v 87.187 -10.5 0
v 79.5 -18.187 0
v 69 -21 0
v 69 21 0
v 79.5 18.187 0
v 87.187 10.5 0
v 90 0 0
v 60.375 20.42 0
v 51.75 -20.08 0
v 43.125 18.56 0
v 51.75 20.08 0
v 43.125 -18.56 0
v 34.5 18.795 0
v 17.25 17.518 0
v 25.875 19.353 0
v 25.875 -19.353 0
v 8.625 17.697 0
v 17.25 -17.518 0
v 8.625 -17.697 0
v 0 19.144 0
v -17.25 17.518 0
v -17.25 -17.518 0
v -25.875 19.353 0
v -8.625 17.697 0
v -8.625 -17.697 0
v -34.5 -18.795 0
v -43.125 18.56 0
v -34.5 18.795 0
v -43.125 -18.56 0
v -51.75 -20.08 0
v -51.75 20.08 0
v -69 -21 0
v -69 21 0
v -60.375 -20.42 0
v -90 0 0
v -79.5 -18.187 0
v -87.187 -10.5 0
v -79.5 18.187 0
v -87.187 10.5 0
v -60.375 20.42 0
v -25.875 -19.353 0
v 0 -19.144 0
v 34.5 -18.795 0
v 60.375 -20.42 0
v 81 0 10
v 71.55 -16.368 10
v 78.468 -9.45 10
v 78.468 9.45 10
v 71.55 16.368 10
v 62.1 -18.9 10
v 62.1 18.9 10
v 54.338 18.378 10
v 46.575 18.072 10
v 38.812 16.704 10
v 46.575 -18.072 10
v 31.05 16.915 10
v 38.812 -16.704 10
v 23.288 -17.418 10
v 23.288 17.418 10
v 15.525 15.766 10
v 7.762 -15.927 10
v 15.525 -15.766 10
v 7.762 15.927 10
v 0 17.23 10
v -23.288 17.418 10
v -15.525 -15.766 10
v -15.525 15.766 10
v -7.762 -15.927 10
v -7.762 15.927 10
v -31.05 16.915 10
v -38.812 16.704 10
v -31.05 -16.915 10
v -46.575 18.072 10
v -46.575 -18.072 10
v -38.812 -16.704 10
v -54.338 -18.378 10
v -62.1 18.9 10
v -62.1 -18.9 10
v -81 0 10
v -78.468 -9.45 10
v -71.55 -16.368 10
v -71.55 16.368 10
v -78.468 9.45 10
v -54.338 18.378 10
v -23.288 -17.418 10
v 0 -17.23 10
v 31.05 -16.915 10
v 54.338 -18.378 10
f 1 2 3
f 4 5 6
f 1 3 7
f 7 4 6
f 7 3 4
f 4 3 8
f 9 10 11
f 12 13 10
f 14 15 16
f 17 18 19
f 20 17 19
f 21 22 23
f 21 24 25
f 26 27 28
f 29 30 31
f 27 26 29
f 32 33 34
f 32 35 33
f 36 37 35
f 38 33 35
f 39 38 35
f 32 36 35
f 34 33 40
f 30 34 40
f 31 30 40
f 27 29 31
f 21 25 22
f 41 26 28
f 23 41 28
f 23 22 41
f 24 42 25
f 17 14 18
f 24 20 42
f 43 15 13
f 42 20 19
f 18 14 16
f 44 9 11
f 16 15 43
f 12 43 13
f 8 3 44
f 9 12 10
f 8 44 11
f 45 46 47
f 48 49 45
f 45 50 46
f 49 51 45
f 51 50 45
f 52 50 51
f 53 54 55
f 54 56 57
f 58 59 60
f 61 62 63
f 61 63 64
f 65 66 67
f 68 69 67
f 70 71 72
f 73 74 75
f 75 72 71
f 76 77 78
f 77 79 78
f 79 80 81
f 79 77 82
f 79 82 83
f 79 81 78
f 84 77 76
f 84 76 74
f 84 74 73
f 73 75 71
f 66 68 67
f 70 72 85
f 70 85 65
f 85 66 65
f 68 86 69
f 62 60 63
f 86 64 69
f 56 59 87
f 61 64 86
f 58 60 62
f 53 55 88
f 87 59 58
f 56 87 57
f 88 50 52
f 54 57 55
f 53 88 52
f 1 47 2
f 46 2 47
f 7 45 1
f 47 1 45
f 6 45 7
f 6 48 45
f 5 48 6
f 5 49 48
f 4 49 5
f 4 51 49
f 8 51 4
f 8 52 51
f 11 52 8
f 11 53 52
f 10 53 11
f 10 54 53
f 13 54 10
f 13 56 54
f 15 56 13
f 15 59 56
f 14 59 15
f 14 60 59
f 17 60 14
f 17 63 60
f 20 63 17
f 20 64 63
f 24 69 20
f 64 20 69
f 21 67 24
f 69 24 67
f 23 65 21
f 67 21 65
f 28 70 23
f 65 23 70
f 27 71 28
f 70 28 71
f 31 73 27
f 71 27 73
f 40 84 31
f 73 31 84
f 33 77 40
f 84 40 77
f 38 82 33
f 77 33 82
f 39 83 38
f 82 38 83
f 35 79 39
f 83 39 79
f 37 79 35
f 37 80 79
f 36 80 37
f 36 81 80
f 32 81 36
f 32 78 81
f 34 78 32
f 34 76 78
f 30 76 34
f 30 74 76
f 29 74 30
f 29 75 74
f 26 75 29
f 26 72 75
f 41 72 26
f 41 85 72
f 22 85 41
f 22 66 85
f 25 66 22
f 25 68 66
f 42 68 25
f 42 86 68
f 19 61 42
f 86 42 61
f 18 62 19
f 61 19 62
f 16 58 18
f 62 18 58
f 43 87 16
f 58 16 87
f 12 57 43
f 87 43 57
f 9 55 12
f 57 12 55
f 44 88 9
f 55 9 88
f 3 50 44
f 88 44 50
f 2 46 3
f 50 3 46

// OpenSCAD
$fn = 32;

// ----------------------------------------------------------------------
// Handle: 180 x 42 mm grip, 10 mm thick
// ----------------------------------------------------------------------

// --- parameters (mm) ---
length = 180;             // grip length
width = 42;               // grip width
thickness = 10;           // grip thickness
waist = 0.86;             // width factor at the middle
draft = 0.9;              // top face scale of the extrusion
scallops = 5;             // finger rests per side
ripple = 0.06;            // depth factor of the finger rests

/* ergonomic grip outline, closed spline-like polygon in the XY plane */
grip = [[-69, 21], [-60.375, 20.42], [-51.75, 20.08], [-43.125, 18.56], [-34.5, 18.795], [-25.875, 19.353], [-17.25, 17.518], [-8.625, 17.697], [0, 19.144], [8.625, 17.697], [17.25, 17.518], [25.875, 19.353], [34.5, 18.795], [43.125, 18.56], [51.75, 20.08], [60.375, 20.42], [69, 21], [79.5, 18.187], [87.187, 10.5], [90, 0], [87.187, -10.5], [79.5, -18.187], [69, -21], [69, -21], [60.375, -20.42], [51.75, -20.08], [43.125, -18.56], [34.5, -18.795], [25.875, -19.353], [17.25, -17.518], [8.625, -17.697], [0, -19.144], [-8.625, -17.697], [-17.25, -17.518], [-25.875, -19.353], [-34.5, -18.795], [-43.125, -18.56], [-51.75, -20.08], [-60.375, -20.42], [-69, -21], [-79.5, -18.187], [-87.187, -10.5], [-90, 0], [-87.187, 10.5], [-79.5, 18.187], [-69, 21]];

module grip_body() {
  linear_extrude(height = thickness, scale = draft) polygon(grip);
}

difference() {
  union() {
    grip_body();
  }
}
